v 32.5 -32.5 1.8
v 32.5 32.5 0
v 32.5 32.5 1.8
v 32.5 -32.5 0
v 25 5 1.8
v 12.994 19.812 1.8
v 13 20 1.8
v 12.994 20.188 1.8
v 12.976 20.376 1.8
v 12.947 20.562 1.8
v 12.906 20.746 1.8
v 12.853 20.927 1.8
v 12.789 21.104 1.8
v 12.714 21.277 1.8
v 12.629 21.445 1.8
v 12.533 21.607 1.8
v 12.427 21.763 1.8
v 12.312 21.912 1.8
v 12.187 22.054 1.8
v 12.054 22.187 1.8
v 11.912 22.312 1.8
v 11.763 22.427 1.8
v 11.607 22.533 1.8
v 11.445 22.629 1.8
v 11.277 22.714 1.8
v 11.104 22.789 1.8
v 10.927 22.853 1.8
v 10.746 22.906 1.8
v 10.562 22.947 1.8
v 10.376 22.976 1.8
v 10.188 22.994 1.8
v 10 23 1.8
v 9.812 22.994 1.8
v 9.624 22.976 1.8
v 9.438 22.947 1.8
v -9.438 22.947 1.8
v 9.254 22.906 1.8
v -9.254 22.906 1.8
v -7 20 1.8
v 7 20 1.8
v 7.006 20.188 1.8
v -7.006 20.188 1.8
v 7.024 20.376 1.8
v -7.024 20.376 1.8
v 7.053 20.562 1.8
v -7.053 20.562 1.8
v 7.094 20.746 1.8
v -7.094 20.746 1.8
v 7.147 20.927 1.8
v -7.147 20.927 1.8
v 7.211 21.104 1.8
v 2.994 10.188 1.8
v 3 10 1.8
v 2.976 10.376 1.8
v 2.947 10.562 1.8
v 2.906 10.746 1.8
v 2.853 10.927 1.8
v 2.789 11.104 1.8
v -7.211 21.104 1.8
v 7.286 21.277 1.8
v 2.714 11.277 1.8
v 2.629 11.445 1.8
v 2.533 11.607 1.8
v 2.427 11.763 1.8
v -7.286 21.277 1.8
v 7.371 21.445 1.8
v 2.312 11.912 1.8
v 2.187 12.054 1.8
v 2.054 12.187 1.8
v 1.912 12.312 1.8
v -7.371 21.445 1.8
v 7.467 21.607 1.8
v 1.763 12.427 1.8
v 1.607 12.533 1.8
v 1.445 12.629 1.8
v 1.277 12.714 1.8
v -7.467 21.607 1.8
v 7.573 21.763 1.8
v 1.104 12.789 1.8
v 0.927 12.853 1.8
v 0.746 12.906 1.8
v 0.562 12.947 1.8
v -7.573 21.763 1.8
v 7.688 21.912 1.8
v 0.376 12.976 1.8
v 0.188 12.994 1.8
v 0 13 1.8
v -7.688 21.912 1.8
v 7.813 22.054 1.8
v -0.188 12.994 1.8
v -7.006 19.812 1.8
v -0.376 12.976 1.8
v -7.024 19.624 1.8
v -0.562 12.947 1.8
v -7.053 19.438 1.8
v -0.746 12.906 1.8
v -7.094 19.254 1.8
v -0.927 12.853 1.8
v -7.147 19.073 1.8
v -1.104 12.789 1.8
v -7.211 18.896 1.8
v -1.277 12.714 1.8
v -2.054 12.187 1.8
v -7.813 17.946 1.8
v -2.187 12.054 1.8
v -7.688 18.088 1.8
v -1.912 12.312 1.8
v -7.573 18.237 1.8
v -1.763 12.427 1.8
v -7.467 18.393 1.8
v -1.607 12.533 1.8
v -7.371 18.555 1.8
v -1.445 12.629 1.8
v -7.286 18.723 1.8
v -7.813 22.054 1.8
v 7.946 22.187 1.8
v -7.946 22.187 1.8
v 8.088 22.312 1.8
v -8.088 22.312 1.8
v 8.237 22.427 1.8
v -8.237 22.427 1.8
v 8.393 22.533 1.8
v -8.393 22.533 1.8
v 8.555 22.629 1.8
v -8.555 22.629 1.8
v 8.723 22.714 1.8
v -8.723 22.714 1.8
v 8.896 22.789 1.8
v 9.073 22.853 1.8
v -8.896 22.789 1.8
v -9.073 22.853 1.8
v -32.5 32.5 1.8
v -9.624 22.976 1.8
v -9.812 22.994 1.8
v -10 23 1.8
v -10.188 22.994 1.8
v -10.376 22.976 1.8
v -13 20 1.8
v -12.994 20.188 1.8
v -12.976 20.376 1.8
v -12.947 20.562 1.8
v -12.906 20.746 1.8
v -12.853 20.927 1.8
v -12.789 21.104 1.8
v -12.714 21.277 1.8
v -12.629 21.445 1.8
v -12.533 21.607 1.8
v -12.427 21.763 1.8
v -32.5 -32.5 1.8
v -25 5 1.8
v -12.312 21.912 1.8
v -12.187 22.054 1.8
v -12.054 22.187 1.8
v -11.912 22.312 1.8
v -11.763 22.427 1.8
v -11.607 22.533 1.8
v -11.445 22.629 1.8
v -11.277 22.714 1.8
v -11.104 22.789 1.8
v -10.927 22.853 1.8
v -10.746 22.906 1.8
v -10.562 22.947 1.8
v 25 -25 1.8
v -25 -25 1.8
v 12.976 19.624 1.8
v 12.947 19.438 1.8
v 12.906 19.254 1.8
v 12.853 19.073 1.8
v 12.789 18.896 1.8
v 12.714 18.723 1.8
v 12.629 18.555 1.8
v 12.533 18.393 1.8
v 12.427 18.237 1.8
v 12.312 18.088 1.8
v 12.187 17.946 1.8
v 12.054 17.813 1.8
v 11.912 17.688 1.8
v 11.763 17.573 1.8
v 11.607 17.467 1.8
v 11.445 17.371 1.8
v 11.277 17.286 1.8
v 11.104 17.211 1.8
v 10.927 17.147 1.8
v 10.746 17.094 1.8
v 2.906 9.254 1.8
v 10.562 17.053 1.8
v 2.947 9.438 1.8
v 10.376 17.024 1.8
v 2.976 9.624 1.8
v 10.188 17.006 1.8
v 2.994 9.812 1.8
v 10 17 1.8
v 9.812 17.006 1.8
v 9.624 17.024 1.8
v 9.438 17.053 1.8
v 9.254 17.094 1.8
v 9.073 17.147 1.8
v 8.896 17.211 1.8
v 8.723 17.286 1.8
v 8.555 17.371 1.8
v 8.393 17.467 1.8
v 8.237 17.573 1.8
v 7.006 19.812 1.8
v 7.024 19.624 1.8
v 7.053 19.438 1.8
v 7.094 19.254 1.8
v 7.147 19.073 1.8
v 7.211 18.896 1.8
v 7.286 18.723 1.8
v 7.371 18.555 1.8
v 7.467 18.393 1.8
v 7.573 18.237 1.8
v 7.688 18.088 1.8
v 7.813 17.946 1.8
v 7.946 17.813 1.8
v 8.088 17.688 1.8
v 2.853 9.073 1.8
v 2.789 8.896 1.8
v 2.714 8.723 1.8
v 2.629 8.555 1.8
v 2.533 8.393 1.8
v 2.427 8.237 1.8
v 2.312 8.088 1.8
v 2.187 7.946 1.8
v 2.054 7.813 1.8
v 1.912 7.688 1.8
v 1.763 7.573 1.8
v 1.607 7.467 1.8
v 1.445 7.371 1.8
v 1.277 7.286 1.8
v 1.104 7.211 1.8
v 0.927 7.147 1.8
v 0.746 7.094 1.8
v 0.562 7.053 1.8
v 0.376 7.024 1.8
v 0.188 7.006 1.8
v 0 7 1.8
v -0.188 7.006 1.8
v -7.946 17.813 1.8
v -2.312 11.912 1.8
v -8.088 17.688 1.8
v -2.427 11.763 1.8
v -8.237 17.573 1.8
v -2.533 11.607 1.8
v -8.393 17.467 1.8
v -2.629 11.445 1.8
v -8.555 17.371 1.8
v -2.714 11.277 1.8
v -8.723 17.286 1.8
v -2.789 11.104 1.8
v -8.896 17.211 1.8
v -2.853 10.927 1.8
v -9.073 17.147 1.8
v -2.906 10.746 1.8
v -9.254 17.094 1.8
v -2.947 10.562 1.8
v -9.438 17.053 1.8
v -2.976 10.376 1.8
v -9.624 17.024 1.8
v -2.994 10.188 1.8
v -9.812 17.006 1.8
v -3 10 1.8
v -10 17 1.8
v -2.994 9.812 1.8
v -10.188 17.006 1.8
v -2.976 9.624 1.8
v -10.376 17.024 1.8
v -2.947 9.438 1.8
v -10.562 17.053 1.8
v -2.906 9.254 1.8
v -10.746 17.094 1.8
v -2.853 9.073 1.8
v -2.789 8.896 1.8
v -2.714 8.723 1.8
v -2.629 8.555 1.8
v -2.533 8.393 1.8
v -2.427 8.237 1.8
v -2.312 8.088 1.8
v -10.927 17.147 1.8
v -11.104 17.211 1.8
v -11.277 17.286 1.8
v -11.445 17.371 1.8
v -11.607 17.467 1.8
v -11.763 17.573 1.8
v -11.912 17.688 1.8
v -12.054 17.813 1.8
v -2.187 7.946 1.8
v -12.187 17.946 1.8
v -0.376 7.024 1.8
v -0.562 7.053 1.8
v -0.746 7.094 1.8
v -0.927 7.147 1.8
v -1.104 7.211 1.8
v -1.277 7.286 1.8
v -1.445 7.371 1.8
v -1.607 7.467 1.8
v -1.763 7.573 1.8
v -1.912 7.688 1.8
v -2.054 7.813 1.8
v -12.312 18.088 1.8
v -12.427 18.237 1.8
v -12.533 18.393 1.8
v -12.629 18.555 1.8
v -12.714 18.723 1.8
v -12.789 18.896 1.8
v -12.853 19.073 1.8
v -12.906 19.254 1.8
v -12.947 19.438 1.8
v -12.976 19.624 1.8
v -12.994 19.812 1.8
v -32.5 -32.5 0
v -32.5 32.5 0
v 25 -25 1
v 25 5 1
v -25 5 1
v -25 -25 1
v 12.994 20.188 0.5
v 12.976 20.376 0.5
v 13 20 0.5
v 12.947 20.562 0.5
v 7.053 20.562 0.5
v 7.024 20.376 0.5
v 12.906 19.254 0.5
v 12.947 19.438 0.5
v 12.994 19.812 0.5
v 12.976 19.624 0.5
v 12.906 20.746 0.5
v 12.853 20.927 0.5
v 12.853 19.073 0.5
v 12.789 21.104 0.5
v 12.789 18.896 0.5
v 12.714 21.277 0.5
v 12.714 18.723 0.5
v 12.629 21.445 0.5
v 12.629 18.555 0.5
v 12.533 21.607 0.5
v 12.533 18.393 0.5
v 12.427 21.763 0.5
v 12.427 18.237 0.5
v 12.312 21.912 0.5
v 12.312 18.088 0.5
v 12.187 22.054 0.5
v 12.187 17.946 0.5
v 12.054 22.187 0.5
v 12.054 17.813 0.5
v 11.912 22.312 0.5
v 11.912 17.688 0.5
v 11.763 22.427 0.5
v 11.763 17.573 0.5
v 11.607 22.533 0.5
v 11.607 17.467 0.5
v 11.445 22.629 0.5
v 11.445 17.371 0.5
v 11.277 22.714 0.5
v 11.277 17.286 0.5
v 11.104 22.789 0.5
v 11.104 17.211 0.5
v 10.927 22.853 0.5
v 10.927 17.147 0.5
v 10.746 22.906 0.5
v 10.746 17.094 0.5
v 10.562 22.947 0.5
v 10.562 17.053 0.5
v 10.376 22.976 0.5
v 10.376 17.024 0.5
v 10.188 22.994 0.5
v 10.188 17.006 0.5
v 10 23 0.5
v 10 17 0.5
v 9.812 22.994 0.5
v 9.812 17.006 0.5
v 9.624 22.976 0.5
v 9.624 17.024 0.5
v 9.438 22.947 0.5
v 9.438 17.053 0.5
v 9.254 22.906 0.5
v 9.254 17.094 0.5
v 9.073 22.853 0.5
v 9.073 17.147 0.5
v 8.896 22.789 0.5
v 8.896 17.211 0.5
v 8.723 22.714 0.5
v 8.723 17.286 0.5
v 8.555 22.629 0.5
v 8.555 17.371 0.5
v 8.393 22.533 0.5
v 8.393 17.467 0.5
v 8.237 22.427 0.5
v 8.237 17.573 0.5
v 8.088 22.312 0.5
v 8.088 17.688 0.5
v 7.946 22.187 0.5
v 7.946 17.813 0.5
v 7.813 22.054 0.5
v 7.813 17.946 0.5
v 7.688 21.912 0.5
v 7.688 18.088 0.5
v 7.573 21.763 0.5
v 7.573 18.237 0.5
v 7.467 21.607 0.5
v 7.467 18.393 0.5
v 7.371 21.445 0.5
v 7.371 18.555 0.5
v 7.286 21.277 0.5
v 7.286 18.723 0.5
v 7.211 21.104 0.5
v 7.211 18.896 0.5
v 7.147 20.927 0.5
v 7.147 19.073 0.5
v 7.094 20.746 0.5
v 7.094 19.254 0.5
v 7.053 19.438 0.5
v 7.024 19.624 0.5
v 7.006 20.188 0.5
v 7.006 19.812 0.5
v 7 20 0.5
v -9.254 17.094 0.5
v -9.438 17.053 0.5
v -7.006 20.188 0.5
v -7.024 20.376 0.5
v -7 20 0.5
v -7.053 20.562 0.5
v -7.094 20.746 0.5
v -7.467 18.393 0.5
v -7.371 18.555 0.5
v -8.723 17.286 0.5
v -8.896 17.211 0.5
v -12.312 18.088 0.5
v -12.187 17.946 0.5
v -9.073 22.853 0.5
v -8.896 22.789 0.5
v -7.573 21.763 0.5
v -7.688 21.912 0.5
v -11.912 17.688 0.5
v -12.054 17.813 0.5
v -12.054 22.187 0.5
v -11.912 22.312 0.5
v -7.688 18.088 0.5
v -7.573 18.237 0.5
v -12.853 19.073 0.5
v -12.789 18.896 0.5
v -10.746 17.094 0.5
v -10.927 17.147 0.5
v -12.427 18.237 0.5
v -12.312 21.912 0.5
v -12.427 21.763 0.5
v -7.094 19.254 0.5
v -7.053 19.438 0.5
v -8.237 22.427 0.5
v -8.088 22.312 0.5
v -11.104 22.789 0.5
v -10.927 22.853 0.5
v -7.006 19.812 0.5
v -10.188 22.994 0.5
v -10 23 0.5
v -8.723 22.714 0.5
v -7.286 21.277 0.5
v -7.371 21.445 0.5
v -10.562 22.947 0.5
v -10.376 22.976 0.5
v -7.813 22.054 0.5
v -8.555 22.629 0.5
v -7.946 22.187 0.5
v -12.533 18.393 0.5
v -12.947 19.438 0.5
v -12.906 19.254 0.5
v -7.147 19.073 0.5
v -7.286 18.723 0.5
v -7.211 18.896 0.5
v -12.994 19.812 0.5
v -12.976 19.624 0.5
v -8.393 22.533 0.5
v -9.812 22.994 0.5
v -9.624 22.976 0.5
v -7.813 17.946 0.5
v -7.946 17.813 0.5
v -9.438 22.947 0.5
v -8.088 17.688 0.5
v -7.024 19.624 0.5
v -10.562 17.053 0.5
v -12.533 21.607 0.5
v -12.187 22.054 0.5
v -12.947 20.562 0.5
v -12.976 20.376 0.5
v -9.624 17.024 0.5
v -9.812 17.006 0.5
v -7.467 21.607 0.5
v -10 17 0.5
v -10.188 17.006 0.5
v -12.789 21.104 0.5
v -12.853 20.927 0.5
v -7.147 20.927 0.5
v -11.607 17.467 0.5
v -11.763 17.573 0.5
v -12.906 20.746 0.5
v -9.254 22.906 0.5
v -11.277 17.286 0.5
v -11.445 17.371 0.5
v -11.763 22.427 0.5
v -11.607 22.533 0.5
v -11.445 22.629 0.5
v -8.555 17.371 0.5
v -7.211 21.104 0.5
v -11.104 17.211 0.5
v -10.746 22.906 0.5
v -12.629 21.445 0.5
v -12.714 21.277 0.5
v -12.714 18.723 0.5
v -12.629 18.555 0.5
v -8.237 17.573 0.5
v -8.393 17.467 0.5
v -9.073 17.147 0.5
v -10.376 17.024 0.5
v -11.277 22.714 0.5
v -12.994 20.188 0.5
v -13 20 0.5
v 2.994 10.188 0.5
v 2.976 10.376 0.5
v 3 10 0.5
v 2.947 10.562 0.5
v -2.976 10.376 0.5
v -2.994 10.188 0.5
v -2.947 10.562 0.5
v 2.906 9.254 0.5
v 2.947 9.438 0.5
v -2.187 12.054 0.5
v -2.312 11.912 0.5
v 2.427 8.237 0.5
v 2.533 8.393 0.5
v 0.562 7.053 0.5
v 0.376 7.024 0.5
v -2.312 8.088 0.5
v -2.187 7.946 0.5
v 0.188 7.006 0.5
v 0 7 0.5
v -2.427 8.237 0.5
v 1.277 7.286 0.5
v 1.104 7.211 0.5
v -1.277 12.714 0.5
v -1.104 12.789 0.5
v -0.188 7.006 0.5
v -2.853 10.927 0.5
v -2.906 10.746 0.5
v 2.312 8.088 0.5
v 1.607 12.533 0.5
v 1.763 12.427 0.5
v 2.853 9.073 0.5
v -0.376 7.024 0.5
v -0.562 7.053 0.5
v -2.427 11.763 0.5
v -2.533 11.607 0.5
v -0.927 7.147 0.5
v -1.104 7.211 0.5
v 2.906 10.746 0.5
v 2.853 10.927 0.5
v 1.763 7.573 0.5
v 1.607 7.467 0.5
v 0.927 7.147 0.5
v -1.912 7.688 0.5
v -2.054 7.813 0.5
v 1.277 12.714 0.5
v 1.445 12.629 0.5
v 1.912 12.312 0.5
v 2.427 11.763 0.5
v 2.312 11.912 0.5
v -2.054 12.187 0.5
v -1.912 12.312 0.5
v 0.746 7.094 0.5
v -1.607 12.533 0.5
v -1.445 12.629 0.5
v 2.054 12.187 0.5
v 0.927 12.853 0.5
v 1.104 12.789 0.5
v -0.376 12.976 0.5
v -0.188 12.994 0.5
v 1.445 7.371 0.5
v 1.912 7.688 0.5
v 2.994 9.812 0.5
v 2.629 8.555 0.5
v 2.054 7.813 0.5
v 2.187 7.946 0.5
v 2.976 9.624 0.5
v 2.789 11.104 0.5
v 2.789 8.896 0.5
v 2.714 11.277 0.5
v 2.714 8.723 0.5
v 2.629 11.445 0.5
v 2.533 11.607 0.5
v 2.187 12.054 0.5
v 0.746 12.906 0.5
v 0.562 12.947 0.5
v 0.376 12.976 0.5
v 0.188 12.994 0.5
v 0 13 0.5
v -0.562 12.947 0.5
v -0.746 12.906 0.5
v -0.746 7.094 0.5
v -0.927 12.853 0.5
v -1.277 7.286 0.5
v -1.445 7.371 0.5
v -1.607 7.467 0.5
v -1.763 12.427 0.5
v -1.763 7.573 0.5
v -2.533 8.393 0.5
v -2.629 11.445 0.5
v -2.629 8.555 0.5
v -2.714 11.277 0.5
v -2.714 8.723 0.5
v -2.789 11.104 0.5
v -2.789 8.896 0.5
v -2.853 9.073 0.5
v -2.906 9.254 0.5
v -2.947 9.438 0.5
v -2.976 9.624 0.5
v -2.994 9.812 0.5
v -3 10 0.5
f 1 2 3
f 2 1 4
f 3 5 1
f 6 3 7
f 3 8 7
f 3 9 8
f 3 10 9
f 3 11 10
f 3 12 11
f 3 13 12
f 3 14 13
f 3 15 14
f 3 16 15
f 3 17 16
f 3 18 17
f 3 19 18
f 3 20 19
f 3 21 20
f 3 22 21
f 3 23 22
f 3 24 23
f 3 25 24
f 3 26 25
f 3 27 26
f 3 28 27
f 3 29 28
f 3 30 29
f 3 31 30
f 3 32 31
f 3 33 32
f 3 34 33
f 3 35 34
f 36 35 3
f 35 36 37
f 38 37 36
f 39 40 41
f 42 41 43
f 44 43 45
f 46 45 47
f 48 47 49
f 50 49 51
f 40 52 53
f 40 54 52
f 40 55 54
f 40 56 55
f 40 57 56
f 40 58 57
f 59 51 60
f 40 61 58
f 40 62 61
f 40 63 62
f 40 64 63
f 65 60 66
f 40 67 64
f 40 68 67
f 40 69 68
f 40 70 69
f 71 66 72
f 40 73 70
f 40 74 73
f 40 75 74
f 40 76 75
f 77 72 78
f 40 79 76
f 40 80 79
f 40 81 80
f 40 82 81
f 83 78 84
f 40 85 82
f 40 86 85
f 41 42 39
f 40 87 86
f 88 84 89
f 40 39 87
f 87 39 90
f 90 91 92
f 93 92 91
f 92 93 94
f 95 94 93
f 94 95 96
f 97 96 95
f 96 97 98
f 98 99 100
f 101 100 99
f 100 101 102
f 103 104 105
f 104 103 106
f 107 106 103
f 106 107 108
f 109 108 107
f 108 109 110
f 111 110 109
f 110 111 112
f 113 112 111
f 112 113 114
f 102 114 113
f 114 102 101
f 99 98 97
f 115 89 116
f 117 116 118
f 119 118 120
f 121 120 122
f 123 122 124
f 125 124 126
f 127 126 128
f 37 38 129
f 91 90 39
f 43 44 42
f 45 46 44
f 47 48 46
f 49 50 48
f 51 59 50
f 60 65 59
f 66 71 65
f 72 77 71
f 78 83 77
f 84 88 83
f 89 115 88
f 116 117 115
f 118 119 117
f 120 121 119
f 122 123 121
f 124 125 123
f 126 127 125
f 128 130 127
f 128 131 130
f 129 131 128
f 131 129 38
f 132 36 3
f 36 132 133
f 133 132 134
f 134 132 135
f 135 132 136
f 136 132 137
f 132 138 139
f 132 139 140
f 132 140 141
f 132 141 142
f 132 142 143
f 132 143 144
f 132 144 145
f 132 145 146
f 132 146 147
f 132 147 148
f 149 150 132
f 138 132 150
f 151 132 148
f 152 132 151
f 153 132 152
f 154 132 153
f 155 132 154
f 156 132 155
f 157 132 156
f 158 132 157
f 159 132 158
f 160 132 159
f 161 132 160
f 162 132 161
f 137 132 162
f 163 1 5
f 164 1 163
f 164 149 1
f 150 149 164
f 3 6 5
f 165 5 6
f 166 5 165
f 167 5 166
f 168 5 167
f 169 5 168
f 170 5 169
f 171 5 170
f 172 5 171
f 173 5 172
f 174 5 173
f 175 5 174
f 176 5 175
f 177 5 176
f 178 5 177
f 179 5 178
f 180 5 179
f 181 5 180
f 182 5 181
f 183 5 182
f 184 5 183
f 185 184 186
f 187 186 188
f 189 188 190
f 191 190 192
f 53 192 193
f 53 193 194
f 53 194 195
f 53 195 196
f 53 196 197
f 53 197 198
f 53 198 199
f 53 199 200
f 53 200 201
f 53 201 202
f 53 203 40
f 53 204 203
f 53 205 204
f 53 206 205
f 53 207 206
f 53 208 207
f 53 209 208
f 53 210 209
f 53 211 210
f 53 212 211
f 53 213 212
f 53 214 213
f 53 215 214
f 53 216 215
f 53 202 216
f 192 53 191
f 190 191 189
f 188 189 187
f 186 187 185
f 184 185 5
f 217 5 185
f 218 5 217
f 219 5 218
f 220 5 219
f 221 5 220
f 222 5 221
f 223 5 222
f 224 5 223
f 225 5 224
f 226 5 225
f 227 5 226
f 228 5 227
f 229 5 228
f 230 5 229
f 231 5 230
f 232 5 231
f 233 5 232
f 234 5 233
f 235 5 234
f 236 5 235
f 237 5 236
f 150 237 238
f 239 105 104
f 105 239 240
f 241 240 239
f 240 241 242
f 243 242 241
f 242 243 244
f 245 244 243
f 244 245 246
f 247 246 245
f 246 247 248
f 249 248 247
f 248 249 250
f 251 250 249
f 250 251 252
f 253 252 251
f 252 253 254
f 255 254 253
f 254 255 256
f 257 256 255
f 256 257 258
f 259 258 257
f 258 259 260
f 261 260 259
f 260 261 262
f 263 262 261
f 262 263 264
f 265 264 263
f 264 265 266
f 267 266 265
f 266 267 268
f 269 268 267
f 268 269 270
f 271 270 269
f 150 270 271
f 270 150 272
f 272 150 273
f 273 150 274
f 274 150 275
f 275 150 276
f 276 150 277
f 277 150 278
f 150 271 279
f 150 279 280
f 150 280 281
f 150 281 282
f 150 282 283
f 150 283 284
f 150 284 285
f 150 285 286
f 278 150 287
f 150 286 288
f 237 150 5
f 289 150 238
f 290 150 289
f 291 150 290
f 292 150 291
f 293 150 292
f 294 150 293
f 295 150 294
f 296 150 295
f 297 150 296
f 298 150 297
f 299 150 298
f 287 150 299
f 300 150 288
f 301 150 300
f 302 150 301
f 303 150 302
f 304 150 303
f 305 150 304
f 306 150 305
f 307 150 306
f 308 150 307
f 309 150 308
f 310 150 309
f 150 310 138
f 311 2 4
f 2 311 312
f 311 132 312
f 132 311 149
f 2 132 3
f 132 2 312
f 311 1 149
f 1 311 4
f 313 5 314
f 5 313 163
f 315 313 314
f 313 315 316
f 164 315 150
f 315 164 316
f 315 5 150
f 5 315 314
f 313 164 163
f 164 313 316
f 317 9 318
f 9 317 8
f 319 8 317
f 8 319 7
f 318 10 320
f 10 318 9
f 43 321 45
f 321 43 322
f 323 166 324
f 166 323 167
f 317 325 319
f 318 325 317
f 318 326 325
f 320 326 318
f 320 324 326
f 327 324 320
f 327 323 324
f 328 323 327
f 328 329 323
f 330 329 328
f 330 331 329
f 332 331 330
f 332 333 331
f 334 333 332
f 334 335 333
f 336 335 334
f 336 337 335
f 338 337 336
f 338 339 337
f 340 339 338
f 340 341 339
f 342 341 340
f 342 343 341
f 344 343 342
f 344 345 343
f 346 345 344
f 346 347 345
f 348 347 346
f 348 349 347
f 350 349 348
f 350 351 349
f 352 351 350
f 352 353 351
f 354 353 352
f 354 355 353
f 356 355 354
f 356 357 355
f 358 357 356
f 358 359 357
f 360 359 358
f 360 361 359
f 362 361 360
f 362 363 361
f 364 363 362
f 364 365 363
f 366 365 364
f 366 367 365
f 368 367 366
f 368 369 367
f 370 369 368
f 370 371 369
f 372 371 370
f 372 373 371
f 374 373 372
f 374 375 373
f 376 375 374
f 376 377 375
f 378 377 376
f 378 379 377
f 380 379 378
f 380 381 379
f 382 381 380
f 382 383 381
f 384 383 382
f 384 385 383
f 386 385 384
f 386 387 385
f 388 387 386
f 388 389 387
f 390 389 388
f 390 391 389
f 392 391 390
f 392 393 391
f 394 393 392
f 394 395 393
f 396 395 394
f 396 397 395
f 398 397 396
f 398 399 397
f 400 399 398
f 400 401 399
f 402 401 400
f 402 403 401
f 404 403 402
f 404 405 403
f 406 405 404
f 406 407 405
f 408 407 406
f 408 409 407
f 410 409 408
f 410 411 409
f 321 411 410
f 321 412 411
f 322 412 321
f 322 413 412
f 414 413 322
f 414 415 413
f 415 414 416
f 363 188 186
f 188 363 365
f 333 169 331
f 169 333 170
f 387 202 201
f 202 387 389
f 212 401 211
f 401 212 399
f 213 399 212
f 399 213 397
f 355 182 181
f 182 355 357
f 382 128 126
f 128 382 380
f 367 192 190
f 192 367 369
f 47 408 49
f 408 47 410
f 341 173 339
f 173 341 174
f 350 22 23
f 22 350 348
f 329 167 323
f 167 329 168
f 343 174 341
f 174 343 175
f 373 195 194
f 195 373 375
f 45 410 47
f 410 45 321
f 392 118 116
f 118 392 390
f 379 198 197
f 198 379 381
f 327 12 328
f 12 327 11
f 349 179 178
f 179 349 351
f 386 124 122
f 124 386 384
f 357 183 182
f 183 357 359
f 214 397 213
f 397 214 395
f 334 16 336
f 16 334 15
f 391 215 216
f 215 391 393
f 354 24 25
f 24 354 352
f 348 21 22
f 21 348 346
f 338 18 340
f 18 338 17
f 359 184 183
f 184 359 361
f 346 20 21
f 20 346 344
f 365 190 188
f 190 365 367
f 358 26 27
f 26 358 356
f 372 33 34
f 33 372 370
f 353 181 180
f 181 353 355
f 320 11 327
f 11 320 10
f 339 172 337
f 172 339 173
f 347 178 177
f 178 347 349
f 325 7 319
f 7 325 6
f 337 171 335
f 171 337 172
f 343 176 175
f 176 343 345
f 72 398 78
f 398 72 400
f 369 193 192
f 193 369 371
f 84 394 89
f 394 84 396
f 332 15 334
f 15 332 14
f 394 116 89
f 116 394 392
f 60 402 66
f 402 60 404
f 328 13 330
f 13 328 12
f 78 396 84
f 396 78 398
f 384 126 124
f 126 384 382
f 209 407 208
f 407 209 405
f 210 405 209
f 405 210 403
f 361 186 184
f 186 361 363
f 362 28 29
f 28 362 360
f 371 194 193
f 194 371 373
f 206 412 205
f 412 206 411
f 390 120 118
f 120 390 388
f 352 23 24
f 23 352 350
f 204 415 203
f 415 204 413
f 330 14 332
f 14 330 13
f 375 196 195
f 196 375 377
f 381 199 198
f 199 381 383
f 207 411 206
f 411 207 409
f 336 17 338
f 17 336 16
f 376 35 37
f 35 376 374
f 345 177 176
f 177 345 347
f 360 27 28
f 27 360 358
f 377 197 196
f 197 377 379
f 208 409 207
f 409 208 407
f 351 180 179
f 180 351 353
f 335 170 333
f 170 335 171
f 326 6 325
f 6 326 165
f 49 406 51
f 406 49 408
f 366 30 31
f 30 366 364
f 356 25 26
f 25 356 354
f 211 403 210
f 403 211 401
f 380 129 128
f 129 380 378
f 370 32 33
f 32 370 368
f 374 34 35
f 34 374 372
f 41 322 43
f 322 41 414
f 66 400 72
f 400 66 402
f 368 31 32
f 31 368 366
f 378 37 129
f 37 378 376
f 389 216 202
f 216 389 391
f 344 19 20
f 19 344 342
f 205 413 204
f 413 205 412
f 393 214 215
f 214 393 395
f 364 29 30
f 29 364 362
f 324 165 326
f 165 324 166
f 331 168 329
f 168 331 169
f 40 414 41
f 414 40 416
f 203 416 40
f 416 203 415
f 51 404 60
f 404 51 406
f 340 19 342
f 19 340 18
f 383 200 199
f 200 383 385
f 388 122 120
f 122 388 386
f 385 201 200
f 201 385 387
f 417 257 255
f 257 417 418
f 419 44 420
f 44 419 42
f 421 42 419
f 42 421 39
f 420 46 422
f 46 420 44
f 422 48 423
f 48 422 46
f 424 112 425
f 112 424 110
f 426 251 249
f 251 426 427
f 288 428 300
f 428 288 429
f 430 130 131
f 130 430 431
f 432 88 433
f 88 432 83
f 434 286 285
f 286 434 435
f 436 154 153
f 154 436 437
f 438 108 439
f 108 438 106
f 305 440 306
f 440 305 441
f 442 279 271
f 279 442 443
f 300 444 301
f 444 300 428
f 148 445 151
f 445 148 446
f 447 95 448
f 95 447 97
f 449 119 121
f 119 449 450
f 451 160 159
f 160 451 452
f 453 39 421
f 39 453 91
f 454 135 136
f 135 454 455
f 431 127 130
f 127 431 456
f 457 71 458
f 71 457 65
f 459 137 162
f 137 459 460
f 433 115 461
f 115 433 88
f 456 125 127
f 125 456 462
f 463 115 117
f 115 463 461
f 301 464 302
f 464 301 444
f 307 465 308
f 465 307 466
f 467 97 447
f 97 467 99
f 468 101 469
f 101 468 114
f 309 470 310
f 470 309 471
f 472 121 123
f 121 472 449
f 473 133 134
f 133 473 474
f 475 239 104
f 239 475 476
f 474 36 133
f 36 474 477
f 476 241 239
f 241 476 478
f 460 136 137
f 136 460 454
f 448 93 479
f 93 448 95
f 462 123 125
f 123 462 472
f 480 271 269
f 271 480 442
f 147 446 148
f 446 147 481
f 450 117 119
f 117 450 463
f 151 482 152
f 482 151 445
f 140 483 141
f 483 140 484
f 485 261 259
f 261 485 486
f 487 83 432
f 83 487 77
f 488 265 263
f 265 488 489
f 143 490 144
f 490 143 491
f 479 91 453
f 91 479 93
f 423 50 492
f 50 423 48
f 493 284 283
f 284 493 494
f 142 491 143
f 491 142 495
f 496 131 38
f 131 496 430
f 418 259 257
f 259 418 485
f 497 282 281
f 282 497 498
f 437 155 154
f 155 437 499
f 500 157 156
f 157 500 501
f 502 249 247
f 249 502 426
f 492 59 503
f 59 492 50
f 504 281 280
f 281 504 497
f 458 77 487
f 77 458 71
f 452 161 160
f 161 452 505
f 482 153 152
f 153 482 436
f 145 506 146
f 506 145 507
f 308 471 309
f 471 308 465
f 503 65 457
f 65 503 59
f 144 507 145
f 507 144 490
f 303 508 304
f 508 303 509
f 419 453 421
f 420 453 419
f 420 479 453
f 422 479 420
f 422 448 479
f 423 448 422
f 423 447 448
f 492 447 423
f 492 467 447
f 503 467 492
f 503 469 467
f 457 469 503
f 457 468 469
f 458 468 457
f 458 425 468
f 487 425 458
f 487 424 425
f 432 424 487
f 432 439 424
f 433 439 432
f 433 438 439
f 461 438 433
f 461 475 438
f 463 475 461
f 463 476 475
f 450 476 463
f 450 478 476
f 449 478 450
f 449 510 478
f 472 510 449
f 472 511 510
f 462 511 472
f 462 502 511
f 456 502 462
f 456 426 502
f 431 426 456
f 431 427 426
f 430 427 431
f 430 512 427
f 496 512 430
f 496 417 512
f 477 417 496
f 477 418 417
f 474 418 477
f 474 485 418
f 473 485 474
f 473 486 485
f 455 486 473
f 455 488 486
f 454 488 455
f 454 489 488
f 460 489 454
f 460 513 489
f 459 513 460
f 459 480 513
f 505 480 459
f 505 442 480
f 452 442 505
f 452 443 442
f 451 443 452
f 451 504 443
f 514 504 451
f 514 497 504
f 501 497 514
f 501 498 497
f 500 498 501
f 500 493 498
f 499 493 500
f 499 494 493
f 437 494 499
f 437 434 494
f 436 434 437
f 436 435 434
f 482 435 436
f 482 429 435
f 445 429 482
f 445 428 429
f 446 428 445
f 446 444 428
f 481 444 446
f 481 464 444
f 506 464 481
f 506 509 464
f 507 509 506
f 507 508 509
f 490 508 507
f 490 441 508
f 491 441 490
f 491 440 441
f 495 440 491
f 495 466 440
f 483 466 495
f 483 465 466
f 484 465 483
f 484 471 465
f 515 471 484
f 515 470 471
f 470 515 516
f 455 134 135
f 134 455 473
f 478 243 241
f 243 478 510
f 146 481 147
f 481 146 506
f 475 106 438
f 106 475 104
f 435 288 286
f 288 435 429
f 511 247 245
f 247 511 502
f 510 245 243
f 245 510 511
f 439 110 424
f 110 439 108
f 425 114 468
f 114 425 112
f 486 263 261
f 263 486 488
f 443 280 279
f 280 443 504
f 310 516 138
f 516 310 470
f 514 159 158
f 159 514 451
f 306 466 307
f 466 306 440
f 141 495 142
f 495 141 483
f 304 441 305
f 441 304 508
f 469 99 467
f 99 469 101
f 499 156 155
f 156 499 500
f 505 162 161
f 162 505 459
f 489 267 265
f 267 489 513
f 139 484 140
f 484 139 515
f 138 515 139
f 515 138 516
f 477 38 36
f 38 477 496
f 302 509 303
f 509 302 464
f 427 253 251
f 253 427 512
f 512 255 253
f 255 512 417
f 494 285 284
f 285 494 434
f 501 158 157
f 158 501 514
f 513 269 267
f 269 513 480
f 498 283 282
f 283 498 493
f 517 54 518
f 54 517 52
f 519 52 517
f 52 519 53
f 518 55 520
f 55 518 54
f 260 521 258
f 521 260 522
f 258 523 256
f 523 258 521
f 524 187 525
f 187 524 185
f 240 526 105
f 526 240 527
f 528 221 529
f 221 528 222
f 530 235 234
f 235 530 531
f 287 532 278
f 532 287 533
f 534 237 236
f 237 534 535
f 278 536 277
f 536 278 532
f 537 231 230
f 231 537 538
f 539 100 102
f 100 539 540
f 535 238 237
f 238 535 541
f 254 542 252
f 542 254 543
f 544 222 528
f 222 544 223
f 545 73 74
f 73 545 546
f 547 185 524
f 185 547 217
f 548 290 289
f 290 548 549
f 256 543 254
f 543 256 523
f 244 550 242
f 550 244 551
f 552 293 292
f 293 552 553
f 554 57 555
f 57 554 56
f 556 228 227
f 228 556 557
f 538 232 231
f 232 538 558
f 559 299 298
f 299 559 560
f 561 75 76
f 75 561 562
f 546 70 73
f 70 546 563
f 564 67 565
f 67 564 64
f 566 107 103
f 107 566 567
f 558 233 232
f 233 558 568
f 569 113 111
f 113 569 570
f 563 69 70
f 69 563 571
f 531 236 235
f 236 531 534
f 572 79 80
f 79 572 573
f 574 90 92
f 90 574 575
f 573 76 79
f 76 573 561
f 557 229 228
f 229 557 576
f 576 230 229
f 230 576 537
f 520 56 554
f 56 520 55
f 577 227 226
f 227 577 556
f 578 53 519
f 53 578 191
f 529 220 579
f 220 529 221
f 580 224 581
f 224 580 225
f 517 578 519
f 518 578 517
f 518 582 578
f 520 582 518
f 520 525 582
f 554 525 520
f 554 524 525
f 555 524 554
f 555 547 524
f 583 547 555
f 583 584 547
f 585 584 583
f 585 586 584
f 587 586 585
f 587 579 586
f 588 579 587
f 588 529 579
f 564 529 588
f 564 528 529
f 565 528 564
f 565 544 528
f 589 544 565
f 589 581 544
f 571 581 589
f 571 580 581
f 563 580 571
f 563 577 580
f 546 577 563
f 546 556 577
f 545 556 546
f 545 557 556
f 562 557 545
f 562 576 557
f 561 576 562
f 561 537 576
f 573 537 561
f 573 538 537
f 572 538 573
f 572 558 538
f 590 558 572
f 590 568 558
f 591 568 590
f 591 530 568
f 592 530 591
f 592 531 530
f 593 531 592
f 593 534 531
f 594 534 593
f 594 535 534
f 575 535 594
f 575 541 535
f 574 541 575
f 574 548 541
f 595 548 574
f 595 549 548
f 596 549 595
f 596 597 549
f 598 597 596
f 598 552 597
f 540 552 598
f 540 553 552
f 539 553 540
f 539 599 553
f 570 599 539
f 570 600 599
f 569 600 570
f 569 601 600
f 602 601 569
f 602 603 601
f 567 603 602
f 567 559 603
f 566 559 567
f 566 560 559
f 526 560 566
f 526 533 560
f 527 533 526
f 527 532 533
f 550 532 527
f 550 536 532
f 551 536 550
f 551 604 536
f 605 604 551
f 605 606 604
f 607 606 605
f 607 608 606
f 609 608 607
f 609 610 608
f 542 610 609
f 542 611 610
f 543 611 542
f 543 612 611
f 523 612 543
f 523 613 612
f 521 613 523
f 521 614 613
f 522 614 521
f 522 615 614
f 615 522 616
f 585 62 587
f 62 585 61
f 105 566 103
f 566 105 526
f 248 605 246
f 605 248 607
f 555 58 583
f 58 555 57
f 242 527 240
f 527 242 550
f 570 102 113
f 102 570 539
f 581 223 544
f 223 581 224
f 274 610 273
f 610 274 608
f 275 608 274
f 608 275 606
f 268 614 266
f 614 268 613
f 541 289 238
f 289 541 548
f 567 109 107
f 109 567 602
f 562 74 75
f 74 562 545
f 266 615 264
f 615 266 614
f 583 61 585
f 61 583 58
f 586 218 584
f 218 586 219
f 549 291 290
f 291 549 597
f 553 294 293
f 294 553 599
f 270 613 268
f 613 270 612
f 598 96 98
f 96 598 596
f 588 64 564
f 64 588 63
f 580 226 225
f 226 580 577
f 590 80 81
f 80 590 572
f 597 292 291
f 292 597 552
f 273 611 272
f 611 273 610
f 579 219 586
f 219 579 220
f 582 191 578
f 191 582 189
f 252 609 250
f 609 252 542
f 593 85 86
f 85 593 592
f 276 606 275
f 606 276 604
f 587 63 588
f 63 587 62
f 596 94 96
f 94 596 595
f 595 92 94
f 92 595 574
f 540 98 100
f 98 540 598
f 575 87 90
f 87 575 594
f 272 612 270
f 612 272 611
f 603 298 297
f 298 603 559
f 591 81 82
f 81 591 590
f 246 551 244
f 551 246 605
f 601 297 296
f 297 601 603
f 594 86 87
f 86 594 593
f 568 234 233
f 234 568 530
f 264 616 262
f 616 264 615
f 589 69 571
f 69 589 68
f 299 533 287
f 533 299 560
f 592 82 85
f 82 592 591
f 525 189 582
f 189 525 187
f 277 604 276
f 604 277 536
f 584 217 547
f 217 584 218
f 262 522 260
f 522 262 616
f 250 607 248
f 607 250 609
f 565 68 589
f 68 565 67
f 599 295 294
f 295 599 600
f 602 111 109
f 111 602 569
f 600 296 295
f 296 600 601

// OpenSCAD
difference(){
	union(){ 

              
            

        translate([-32.5, -32.5,0]){
           cube([65,65,1.8], center=false);
        }                


        translate([0,10,0]){
            rotate([0,0,0]){
                cylinder(h=1.8, r=8, $fn=100, center=false);
            }   
        }



	}
	union() {

        translate([-25, -25,1]){
           cube([50,30,1.8], center=false);
        }                

        translate([+10,20,0.5]){
            rotate([0,0,0]){
                cylinder(h=5, r=3, $fn=100, center=false);
            }   
        }
        translate([-10,20,0.5]){
            rotate([0,0,0]){
                cylinder(h=5, r=3, $fn=100, center=false);
            }   
        }
        translate([0,10,0.5]){
            rotate([0,0,0]){
                cylinder(h=5, r=3, $fn=100, center=false);
            }   
        }

	}
}
